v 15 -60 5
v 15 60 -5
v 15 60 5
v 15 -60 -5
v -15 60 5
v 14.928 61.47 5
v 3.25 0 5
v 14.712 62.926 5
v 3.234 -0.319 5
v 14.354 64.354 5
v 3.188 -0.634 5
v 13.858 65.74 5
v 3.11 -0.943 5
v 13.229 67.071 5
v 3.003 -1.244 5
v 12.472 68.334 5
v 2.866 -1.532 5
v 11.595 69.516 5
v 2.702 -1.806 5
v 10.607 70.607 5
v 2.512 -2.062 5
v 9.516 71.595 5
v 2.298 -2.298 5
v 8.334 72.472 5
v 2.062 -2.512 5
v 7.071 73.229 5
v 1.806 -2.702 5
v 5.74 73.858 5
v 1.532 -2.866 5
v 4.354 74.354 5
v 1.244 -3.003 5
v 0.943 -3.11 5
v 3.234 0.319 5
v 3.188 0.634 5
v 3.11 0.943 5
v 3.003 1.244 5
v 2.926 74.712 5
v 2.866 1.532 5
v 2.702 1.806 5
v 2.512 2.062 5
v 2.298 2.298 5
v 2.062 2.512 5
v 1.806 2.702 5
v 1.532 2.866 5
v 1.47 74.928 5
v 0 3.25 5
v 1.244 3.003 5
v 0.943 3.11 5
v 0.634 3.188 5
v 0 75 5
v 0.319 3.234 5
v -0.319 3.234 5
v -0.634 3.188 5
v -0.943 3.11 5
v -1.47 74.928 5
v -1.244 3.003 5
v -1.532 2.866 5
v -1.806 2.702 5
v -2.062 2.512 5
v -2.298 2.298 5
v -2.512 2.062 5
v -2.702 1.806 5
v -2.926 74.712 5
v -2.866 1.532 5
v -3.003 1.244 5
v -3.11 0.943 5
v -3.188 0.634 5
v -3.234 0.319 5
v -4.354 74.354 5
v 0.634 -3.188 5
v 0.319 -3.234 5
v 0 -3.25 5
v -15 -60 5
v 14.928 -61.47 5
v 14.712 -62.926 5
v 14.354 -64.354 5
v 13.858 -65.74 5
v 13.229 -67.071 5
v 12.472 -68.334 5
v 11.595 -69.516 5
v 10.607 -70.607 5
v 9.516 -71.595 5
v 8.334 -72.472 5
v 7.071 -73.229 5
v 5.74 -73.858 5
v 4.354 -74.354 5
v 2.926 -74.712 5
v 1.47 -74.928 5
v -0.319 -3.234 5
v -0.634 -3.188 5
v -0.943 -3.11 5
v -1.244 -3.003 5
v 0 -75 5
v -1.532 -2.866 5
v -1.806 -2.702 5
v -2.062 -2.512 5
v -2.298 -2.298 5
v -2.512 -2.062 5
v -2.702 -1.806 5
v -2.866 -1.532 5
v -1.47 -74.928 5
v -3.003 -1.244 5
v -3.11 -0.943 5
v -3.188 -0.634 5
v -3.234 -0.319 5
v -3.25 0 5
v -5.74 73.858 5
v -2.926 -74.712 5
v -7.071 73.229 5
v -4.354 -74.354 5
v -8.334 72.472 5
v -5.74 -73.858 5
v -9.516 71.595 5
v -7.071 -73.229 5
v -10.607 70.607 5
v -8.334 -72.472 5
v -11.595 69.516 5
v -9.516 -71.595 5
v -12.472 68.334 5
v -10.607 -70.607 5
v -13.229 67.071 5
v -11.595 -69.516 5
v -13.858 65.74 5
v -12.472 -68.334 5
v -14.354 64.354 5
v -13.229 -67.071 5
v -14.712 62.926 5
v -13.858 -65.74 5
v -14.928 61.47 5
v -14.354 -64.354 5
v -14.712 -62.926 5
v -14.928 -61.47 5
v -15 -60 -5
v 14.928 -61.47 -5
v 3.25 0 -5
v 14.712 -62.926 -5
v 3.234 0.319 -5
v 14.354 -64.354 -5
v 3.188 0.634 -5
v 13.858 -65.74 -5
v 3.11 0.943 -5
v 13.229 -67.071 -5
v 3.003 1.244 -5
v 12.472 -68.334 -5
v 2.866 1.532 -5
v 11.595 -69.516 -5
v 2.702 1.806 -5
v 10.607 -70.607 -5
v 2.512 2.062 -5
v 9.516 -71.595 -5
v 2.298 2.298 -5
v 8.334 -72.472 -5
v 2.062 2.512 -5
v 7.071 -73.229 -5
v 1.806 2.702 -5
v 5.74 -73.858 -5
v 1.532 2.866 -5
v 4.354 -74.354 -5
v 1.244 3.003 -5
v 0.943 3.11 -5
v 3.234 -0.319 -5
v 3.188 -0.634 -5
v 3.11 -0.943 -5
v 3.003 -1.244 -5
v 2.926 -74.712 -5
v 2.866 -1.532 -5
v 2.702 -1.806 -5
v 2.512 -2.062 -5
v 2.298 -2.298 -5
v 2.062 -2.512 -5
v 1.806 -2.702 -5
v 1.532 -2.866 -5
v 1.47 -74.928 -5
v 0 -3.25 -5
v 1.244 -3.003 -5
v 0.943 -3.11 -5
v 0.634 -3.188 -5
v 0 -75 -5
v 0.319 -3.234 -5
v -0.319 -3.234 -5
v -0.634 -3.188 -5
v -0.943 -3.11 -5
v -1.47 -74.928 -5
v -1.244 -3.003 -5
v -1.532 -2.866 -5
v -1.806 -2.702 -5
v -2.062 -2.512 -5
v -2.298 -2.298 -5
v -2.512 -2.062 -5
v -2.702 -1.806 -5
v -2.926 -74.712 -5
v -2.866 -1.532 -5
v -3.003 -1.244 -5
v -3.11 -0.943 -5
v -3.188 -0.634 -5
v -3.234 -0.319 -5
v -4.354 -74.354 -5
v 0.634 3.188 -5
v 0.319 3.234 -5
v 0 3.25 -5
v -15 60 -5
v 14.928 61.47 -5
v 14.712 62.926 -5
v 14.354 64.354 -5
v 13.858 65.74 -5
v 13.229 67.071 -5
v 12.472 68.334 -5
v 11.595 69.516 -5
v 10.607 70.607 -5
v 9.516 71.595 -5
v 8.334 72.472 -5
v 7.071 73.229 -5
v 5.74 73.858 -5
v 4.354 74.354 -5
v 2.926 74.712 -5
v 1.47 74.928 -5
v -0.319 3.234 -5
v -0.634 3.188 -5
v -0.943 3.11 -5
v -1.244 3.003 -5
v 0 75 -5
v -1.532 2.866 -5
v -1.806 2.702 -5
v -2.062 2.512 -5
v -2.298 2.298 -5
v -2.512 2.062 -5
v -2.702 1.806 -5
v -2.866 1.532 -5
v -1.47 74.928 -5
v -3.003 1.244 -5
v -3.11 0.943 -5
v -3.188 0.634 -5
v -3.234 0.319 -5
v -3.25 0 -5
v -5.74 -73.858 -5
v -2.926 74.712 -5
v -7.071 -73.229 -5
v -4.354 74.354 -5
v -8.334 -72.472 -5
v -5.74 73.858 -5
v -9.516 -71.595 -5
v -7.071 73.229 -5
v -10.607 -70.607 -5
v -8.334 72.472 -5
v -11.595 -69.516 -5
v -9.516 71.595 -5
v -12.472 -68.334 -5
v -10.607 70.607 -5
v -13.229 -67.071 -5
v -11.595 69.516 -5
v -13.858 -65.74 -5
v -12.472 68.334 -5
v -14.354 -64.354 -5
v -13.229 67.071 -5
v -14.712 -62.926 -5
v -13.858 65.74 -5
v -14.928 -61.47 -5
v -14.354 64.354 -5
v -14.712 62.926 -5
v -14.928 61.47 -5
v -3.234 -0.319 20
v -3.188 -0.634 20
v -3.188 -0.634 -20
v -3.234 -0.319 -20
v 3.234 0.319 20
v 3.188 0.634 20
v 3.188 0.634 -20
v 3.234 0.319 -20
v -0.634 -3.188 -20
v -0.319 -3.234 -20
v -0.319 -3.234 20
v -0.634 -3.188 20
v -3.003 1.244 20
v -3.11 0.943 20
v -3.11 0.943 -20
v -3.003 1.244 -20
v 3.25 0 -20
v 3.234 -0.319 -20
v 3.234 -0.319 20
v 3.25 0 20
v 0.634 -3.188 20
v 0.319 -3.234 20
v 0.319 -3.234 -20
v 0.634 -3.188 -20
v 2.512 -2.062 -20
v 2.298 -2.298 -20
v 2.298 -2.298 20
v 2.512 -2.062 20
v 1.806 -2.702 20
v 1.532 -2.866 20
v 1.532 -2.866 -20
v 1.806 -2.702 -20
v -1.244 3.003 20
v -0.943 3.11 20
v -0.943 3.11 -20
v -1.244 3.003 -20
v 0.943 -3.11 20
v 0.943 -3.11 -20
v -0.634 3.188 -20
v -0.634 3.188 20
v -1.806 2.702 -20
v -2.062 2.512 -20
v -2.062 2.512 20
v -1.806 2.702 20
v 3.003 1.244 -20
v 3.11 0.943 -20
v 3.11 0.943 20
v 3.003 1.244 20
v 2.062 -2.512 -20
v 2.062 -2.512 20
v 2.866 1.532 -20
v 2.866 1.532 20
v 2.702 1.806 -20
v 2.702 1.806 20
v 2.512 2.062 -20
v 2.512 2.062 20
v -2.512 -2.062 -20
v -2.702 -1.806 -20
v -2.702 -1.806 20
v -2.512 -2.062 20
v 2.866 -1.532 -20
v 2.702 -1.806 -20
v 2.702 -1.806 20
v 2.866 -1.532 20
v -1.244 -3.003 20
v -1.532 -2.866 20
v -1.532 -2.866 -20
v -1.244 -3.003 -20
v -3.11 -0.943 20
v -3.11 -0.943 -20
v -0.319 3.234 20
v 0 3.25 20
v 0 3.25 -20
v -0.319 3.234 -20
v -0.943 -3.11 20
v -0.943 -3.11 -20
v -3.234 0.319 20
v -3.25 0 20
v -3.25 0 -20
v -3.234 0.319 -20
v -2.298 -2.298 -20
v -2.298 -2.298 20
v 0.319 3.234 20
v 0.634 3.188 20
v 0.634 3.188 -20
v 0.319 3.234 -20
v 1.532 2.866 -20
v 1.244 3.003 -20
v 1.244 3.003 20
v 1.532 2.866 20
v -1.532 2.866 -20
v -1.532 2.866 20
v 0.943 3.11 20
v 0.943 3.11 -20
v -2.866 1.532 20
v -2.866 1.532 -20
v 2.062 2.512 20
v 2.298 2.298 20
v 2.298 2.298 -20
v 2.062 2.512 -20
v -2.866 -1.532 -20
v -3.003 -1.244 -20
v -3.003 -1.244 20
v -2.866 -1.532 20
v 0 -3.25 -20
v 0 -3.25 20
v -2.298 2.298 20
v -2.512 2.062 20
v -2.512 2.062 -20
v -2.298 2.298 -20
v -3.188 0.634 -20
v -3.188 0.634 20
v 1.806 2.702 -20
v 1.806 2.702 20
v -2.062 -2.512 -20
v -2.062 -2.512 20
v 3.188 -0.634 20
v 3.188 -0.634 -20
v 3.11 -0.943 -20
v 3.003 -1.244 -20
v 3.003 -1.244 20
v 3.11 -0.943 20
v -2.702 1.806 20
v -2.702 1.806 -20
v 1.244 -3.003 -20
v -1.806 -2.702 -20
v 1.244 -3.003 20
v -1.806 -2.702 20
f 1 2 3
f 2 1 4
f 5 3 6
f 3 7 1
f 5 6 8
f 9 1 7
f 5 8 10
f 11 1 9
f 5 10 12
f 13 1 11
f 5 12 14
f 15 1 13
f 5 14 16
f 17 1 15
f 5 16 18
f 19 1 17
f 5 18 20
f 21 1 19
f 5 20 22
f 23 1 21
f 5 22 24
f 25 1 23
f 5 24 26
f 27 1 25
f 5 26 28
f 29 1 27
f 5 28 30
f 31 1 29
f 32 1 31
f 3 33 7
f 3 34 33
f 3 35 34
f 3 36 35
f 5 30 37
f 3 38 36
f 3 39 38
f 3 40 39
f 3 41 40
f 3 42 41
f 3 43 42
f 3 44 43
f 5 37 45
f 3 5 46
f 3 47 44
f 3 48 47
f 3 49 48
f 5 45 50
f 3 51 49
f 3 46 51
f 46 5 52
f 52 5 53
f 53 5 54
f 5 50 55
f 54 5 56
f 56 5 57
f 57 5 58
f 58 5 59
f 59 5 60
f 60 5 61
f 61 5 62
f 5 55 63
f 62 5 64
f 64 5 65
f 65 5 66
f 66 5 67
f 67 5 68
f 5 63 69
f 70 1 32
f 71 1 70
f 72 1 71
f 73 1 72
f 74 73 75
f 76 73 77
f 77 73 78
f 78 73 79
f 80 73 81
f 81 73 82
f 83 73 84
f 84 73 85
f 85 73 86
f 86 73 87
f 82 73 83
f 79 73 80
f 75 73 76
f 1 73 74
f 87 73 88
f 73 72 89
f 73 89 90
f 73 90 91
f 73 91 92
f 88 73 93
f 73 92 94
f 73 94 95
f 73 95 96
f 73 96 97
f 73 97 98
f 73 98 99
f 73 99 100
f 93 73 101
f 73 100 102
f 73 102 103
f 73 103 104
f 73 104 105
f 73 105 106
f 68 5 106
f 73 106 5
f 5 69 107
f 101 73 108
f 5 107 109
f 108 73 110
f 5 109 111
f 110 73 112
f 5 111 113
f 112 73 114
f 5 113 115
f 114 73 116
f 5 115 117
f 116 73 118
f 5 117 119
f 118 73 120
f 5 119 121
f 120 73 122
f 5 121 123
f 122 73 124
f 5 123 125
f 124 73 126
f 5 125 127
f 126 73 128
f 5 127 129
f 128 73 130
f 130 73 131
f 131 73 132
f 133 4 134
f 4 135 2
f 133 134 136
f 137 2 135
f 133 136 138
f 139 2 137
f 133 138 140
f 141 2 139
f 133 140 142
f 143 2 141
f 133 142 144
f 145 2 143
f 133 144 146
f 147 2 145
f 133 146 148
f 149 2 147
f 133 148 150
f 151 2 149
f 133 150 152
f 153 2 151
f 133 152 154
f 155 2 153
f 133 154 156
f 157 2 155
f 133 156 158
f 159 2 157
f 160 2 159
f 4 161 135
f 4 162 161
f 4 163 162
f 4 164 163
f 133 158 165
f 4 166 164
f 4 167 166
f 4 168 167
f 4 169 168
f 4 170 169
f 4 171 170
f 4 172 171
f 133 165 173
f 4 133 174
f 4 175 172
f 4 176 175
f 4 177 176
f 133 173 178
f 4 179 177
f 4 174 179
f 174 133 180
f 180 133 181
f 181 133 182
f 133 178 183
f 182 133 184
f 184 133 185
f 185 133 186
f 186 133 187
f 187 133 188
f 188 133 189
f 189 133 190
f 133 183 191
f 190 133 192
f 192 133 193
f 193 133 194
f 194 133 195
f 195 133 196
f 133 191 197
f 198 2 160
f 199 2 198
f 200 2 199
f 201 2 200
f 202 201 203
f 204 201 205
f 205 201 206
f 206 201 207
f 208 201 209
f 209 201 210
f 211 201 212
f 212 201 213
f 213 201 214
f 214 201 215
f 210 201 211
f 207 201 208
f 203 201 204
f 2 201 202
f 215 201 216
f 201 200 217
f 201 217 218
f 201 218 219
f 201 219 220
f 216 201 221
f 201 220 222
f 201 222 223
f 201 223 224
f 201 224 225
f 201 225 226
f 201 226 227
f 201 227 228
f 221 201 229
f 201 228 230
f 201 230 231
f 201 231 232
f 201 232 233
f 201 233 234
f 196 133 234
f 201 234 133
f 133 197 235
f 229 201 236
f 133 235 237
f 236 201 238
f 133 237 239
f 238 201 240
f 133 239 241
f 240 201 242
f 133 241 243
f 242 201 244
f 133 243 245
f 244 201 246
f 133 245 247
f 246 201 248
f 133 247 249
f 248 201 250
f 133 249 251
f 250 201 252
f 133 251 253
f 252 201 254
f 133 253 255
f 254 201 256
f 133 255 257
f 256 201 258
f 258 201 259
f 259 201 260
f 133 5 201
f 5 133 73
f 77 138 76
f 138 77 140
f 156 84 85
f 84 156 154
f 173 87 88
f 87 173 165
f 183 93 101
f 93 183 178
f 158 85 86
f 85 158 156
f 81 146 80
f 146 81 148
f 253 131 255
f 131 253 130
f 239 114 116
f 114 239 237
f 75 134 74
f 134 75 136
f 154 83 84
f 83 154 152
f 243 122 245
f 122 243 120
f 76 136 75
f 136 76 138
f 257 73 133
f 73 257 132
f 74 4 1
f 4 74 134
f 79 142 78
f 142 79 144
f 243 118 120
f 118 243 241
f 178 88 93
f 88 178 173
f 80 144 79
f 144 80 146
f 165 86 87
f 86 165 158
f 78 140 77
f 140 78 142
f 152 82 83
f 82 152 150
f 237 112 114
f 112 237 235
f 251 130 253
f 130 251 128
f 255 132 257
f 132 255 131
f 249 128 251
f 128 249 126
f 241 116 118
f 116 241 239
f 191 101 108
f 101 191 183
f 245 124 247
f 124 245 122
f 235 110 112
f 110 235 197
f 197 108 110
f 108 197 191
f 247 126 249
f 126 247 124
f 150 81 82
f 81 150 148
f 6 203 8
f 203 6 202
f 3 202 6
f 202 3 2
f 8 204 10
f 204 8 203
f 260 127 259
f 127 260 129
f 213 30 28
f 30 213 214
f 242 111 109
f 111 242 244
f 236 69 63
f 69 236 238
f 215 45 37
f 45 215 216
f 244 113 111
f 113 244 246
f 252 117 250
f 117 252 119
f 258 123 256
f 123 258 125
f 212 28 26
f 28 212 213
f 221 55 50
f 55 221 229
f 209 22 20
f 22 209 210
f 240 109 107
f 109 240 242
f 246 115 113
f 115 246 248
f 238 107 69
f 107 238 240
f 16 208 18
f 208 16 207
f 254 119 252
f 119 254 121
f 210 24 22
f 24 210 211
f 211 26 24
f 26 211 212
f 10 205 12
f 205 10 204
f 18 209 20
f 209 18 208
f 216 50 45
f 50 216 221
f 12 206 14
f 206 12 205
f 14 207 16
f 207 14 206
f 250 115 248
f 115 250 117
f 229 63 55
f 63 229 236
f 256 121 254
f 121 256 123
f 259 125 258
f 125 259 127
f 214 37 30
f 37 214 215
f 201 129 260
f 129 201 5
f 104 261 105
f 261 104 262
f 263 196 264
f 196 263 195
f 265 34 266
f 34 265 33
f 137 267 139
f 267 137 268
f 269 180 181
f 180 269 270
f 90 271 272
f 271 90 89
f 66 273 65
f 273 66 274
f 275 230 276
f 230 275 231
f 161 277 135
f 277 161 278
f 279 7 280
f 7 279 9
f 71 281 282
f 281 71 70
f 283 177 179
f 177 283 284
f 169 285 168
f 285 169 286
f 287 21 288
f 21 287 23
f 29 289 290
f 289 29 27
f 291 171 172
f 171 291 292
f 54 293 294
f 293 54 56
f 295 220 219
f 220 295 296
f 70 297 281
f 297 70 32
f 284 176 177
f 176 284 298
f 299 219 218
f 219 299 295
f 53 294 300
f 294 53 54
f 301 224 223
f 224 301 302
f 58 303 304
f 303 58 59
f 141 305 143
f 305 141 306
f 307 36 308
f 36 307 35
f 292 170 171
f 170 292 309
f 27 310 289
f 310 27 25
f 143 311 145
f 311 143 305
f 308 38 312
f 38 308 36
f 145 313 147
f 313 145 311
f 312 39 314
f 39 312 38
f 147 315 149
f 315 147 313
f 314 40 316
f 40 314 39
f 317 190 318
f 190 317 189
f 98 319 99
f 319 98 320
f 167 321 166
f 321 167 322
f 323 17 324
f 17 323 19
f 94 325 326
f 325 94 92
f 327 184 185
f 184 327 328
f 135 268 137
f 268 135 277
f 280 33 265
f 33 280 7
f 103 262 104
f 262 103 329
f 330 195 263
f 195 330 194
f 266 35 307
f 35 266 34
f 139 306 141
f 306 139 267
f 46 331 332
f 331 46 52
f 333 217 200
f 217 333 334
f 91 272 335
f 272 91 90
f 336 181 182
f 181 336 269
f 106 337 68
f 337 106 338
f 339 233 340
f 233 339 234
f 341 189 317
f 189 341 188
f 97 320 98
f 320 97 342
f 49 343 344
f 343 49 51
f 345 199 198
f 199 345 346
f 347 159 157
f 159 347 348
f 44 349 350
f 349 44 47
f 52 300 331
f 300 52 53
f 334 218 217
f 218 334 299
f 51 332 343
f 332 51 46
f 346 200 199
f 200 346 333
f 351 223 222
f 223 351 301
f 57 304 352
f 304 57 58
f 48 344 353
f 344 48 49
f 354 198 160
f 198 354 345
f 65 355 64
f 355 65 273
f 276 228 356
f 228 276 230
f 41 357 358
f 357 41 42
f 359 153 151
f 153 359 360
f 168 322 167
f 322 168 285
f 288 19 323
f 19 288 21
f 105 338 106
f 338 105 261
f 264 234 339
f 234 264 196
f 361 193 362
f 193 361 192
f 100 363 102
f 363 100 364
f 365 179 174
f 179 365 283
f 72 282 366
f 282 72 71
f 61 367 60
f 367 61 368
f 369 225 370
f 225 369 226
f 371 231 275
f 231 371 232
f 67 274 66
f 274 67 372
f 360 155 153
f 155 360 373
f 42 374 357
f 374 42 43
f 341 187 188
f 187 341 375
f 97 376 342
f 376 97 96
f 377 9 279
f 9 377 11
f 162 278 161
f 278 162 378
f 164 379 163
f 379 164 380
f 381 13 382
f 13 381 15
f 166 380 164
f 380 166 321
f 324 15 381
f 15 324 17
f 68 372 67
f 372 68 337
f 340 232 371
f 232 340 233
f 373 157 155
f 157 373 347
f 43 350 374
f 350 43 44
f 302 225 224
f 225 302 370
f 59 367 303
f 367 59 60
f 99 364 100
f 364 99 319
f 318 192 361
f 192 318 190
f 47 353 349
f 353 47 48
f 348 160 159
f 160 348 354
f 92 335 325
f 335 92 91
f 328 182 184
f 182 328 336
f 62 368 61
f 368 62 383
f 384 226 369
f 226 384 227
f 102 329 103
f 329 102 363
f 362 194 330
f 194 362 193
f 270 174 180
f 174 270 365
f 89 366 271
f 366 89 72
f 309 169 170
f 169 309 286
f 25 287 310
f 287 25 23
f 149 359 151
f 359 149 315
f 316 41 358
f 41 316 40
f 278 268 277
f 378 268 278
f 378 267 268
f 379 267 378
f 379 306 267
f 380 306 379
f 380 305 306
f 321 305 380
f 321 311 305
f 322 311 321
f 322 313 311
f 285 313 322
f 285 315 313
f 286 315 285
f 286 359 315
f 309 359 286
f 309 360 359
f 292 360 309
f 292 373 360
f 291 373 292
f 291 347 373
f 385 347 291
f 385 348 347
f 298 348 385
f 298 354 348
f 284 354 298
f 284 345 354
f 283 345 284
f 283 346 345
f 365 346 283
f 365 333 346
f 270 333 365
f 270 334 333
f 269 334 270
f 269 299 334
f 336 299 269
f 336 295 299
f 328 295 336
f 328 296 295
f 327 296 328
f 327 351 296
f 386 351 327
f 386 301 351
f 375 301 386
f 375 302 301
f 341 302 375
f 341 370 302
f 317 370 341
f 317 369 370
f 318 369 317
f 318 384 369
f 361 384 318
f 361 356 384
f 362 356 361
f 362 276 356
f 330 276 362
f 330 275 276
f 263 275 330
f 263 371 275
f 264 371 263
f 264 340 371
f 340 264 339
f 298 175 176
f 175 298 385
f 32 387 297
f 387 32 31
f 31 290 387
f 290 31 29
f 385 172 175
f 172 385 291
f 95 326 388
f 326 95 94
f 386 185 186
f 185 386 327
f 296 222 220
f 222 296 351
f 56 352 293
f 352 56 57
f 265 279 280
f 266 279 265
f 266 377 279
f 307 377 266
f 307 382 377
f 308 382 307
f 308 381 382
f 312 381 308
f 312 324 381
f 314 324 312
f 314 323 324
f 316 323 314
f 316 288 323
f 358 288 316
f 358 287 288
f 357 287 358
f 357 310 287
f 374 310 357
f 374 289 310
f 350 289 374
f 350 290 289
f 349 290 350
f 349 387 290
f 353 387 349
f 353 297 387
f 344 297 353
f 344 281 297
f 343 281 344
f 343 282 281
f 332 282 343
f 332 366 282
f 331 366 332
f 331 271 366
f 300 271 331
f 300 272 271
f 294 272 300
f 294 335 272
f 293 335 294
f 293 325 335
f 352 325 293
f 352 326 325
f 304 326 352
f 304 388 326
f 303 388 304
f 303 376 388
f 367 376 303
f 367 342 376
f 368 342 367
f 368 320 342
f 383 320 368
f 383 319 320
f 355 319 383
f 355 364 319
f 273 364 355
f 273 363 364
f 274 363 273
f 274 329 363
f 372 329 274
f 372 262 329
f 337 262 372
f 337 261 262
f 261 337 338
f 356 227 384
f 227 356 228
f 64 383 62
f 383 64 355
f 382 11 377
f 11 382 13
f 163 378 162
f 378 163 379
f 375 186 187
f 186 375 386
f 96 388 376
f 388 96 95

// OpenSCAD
$fn = 64;
plate_depth = 10;
plate_length = 120;
plate_width = 30;

module base(){
    cube([plate_width,plate_length,plate_depth],center=true);
    color("red")
    
    translate([0,-plate_length/2,0])
    cylinder (h=plate_depth,d=plate_width,center=true);
    color("green")
    translate([0,plate_length/2,0])
    cylinder (h=plate_depth,d=plate_width,center=true);
}

base();

cylinder(h=40,d=6.5,center=true);
